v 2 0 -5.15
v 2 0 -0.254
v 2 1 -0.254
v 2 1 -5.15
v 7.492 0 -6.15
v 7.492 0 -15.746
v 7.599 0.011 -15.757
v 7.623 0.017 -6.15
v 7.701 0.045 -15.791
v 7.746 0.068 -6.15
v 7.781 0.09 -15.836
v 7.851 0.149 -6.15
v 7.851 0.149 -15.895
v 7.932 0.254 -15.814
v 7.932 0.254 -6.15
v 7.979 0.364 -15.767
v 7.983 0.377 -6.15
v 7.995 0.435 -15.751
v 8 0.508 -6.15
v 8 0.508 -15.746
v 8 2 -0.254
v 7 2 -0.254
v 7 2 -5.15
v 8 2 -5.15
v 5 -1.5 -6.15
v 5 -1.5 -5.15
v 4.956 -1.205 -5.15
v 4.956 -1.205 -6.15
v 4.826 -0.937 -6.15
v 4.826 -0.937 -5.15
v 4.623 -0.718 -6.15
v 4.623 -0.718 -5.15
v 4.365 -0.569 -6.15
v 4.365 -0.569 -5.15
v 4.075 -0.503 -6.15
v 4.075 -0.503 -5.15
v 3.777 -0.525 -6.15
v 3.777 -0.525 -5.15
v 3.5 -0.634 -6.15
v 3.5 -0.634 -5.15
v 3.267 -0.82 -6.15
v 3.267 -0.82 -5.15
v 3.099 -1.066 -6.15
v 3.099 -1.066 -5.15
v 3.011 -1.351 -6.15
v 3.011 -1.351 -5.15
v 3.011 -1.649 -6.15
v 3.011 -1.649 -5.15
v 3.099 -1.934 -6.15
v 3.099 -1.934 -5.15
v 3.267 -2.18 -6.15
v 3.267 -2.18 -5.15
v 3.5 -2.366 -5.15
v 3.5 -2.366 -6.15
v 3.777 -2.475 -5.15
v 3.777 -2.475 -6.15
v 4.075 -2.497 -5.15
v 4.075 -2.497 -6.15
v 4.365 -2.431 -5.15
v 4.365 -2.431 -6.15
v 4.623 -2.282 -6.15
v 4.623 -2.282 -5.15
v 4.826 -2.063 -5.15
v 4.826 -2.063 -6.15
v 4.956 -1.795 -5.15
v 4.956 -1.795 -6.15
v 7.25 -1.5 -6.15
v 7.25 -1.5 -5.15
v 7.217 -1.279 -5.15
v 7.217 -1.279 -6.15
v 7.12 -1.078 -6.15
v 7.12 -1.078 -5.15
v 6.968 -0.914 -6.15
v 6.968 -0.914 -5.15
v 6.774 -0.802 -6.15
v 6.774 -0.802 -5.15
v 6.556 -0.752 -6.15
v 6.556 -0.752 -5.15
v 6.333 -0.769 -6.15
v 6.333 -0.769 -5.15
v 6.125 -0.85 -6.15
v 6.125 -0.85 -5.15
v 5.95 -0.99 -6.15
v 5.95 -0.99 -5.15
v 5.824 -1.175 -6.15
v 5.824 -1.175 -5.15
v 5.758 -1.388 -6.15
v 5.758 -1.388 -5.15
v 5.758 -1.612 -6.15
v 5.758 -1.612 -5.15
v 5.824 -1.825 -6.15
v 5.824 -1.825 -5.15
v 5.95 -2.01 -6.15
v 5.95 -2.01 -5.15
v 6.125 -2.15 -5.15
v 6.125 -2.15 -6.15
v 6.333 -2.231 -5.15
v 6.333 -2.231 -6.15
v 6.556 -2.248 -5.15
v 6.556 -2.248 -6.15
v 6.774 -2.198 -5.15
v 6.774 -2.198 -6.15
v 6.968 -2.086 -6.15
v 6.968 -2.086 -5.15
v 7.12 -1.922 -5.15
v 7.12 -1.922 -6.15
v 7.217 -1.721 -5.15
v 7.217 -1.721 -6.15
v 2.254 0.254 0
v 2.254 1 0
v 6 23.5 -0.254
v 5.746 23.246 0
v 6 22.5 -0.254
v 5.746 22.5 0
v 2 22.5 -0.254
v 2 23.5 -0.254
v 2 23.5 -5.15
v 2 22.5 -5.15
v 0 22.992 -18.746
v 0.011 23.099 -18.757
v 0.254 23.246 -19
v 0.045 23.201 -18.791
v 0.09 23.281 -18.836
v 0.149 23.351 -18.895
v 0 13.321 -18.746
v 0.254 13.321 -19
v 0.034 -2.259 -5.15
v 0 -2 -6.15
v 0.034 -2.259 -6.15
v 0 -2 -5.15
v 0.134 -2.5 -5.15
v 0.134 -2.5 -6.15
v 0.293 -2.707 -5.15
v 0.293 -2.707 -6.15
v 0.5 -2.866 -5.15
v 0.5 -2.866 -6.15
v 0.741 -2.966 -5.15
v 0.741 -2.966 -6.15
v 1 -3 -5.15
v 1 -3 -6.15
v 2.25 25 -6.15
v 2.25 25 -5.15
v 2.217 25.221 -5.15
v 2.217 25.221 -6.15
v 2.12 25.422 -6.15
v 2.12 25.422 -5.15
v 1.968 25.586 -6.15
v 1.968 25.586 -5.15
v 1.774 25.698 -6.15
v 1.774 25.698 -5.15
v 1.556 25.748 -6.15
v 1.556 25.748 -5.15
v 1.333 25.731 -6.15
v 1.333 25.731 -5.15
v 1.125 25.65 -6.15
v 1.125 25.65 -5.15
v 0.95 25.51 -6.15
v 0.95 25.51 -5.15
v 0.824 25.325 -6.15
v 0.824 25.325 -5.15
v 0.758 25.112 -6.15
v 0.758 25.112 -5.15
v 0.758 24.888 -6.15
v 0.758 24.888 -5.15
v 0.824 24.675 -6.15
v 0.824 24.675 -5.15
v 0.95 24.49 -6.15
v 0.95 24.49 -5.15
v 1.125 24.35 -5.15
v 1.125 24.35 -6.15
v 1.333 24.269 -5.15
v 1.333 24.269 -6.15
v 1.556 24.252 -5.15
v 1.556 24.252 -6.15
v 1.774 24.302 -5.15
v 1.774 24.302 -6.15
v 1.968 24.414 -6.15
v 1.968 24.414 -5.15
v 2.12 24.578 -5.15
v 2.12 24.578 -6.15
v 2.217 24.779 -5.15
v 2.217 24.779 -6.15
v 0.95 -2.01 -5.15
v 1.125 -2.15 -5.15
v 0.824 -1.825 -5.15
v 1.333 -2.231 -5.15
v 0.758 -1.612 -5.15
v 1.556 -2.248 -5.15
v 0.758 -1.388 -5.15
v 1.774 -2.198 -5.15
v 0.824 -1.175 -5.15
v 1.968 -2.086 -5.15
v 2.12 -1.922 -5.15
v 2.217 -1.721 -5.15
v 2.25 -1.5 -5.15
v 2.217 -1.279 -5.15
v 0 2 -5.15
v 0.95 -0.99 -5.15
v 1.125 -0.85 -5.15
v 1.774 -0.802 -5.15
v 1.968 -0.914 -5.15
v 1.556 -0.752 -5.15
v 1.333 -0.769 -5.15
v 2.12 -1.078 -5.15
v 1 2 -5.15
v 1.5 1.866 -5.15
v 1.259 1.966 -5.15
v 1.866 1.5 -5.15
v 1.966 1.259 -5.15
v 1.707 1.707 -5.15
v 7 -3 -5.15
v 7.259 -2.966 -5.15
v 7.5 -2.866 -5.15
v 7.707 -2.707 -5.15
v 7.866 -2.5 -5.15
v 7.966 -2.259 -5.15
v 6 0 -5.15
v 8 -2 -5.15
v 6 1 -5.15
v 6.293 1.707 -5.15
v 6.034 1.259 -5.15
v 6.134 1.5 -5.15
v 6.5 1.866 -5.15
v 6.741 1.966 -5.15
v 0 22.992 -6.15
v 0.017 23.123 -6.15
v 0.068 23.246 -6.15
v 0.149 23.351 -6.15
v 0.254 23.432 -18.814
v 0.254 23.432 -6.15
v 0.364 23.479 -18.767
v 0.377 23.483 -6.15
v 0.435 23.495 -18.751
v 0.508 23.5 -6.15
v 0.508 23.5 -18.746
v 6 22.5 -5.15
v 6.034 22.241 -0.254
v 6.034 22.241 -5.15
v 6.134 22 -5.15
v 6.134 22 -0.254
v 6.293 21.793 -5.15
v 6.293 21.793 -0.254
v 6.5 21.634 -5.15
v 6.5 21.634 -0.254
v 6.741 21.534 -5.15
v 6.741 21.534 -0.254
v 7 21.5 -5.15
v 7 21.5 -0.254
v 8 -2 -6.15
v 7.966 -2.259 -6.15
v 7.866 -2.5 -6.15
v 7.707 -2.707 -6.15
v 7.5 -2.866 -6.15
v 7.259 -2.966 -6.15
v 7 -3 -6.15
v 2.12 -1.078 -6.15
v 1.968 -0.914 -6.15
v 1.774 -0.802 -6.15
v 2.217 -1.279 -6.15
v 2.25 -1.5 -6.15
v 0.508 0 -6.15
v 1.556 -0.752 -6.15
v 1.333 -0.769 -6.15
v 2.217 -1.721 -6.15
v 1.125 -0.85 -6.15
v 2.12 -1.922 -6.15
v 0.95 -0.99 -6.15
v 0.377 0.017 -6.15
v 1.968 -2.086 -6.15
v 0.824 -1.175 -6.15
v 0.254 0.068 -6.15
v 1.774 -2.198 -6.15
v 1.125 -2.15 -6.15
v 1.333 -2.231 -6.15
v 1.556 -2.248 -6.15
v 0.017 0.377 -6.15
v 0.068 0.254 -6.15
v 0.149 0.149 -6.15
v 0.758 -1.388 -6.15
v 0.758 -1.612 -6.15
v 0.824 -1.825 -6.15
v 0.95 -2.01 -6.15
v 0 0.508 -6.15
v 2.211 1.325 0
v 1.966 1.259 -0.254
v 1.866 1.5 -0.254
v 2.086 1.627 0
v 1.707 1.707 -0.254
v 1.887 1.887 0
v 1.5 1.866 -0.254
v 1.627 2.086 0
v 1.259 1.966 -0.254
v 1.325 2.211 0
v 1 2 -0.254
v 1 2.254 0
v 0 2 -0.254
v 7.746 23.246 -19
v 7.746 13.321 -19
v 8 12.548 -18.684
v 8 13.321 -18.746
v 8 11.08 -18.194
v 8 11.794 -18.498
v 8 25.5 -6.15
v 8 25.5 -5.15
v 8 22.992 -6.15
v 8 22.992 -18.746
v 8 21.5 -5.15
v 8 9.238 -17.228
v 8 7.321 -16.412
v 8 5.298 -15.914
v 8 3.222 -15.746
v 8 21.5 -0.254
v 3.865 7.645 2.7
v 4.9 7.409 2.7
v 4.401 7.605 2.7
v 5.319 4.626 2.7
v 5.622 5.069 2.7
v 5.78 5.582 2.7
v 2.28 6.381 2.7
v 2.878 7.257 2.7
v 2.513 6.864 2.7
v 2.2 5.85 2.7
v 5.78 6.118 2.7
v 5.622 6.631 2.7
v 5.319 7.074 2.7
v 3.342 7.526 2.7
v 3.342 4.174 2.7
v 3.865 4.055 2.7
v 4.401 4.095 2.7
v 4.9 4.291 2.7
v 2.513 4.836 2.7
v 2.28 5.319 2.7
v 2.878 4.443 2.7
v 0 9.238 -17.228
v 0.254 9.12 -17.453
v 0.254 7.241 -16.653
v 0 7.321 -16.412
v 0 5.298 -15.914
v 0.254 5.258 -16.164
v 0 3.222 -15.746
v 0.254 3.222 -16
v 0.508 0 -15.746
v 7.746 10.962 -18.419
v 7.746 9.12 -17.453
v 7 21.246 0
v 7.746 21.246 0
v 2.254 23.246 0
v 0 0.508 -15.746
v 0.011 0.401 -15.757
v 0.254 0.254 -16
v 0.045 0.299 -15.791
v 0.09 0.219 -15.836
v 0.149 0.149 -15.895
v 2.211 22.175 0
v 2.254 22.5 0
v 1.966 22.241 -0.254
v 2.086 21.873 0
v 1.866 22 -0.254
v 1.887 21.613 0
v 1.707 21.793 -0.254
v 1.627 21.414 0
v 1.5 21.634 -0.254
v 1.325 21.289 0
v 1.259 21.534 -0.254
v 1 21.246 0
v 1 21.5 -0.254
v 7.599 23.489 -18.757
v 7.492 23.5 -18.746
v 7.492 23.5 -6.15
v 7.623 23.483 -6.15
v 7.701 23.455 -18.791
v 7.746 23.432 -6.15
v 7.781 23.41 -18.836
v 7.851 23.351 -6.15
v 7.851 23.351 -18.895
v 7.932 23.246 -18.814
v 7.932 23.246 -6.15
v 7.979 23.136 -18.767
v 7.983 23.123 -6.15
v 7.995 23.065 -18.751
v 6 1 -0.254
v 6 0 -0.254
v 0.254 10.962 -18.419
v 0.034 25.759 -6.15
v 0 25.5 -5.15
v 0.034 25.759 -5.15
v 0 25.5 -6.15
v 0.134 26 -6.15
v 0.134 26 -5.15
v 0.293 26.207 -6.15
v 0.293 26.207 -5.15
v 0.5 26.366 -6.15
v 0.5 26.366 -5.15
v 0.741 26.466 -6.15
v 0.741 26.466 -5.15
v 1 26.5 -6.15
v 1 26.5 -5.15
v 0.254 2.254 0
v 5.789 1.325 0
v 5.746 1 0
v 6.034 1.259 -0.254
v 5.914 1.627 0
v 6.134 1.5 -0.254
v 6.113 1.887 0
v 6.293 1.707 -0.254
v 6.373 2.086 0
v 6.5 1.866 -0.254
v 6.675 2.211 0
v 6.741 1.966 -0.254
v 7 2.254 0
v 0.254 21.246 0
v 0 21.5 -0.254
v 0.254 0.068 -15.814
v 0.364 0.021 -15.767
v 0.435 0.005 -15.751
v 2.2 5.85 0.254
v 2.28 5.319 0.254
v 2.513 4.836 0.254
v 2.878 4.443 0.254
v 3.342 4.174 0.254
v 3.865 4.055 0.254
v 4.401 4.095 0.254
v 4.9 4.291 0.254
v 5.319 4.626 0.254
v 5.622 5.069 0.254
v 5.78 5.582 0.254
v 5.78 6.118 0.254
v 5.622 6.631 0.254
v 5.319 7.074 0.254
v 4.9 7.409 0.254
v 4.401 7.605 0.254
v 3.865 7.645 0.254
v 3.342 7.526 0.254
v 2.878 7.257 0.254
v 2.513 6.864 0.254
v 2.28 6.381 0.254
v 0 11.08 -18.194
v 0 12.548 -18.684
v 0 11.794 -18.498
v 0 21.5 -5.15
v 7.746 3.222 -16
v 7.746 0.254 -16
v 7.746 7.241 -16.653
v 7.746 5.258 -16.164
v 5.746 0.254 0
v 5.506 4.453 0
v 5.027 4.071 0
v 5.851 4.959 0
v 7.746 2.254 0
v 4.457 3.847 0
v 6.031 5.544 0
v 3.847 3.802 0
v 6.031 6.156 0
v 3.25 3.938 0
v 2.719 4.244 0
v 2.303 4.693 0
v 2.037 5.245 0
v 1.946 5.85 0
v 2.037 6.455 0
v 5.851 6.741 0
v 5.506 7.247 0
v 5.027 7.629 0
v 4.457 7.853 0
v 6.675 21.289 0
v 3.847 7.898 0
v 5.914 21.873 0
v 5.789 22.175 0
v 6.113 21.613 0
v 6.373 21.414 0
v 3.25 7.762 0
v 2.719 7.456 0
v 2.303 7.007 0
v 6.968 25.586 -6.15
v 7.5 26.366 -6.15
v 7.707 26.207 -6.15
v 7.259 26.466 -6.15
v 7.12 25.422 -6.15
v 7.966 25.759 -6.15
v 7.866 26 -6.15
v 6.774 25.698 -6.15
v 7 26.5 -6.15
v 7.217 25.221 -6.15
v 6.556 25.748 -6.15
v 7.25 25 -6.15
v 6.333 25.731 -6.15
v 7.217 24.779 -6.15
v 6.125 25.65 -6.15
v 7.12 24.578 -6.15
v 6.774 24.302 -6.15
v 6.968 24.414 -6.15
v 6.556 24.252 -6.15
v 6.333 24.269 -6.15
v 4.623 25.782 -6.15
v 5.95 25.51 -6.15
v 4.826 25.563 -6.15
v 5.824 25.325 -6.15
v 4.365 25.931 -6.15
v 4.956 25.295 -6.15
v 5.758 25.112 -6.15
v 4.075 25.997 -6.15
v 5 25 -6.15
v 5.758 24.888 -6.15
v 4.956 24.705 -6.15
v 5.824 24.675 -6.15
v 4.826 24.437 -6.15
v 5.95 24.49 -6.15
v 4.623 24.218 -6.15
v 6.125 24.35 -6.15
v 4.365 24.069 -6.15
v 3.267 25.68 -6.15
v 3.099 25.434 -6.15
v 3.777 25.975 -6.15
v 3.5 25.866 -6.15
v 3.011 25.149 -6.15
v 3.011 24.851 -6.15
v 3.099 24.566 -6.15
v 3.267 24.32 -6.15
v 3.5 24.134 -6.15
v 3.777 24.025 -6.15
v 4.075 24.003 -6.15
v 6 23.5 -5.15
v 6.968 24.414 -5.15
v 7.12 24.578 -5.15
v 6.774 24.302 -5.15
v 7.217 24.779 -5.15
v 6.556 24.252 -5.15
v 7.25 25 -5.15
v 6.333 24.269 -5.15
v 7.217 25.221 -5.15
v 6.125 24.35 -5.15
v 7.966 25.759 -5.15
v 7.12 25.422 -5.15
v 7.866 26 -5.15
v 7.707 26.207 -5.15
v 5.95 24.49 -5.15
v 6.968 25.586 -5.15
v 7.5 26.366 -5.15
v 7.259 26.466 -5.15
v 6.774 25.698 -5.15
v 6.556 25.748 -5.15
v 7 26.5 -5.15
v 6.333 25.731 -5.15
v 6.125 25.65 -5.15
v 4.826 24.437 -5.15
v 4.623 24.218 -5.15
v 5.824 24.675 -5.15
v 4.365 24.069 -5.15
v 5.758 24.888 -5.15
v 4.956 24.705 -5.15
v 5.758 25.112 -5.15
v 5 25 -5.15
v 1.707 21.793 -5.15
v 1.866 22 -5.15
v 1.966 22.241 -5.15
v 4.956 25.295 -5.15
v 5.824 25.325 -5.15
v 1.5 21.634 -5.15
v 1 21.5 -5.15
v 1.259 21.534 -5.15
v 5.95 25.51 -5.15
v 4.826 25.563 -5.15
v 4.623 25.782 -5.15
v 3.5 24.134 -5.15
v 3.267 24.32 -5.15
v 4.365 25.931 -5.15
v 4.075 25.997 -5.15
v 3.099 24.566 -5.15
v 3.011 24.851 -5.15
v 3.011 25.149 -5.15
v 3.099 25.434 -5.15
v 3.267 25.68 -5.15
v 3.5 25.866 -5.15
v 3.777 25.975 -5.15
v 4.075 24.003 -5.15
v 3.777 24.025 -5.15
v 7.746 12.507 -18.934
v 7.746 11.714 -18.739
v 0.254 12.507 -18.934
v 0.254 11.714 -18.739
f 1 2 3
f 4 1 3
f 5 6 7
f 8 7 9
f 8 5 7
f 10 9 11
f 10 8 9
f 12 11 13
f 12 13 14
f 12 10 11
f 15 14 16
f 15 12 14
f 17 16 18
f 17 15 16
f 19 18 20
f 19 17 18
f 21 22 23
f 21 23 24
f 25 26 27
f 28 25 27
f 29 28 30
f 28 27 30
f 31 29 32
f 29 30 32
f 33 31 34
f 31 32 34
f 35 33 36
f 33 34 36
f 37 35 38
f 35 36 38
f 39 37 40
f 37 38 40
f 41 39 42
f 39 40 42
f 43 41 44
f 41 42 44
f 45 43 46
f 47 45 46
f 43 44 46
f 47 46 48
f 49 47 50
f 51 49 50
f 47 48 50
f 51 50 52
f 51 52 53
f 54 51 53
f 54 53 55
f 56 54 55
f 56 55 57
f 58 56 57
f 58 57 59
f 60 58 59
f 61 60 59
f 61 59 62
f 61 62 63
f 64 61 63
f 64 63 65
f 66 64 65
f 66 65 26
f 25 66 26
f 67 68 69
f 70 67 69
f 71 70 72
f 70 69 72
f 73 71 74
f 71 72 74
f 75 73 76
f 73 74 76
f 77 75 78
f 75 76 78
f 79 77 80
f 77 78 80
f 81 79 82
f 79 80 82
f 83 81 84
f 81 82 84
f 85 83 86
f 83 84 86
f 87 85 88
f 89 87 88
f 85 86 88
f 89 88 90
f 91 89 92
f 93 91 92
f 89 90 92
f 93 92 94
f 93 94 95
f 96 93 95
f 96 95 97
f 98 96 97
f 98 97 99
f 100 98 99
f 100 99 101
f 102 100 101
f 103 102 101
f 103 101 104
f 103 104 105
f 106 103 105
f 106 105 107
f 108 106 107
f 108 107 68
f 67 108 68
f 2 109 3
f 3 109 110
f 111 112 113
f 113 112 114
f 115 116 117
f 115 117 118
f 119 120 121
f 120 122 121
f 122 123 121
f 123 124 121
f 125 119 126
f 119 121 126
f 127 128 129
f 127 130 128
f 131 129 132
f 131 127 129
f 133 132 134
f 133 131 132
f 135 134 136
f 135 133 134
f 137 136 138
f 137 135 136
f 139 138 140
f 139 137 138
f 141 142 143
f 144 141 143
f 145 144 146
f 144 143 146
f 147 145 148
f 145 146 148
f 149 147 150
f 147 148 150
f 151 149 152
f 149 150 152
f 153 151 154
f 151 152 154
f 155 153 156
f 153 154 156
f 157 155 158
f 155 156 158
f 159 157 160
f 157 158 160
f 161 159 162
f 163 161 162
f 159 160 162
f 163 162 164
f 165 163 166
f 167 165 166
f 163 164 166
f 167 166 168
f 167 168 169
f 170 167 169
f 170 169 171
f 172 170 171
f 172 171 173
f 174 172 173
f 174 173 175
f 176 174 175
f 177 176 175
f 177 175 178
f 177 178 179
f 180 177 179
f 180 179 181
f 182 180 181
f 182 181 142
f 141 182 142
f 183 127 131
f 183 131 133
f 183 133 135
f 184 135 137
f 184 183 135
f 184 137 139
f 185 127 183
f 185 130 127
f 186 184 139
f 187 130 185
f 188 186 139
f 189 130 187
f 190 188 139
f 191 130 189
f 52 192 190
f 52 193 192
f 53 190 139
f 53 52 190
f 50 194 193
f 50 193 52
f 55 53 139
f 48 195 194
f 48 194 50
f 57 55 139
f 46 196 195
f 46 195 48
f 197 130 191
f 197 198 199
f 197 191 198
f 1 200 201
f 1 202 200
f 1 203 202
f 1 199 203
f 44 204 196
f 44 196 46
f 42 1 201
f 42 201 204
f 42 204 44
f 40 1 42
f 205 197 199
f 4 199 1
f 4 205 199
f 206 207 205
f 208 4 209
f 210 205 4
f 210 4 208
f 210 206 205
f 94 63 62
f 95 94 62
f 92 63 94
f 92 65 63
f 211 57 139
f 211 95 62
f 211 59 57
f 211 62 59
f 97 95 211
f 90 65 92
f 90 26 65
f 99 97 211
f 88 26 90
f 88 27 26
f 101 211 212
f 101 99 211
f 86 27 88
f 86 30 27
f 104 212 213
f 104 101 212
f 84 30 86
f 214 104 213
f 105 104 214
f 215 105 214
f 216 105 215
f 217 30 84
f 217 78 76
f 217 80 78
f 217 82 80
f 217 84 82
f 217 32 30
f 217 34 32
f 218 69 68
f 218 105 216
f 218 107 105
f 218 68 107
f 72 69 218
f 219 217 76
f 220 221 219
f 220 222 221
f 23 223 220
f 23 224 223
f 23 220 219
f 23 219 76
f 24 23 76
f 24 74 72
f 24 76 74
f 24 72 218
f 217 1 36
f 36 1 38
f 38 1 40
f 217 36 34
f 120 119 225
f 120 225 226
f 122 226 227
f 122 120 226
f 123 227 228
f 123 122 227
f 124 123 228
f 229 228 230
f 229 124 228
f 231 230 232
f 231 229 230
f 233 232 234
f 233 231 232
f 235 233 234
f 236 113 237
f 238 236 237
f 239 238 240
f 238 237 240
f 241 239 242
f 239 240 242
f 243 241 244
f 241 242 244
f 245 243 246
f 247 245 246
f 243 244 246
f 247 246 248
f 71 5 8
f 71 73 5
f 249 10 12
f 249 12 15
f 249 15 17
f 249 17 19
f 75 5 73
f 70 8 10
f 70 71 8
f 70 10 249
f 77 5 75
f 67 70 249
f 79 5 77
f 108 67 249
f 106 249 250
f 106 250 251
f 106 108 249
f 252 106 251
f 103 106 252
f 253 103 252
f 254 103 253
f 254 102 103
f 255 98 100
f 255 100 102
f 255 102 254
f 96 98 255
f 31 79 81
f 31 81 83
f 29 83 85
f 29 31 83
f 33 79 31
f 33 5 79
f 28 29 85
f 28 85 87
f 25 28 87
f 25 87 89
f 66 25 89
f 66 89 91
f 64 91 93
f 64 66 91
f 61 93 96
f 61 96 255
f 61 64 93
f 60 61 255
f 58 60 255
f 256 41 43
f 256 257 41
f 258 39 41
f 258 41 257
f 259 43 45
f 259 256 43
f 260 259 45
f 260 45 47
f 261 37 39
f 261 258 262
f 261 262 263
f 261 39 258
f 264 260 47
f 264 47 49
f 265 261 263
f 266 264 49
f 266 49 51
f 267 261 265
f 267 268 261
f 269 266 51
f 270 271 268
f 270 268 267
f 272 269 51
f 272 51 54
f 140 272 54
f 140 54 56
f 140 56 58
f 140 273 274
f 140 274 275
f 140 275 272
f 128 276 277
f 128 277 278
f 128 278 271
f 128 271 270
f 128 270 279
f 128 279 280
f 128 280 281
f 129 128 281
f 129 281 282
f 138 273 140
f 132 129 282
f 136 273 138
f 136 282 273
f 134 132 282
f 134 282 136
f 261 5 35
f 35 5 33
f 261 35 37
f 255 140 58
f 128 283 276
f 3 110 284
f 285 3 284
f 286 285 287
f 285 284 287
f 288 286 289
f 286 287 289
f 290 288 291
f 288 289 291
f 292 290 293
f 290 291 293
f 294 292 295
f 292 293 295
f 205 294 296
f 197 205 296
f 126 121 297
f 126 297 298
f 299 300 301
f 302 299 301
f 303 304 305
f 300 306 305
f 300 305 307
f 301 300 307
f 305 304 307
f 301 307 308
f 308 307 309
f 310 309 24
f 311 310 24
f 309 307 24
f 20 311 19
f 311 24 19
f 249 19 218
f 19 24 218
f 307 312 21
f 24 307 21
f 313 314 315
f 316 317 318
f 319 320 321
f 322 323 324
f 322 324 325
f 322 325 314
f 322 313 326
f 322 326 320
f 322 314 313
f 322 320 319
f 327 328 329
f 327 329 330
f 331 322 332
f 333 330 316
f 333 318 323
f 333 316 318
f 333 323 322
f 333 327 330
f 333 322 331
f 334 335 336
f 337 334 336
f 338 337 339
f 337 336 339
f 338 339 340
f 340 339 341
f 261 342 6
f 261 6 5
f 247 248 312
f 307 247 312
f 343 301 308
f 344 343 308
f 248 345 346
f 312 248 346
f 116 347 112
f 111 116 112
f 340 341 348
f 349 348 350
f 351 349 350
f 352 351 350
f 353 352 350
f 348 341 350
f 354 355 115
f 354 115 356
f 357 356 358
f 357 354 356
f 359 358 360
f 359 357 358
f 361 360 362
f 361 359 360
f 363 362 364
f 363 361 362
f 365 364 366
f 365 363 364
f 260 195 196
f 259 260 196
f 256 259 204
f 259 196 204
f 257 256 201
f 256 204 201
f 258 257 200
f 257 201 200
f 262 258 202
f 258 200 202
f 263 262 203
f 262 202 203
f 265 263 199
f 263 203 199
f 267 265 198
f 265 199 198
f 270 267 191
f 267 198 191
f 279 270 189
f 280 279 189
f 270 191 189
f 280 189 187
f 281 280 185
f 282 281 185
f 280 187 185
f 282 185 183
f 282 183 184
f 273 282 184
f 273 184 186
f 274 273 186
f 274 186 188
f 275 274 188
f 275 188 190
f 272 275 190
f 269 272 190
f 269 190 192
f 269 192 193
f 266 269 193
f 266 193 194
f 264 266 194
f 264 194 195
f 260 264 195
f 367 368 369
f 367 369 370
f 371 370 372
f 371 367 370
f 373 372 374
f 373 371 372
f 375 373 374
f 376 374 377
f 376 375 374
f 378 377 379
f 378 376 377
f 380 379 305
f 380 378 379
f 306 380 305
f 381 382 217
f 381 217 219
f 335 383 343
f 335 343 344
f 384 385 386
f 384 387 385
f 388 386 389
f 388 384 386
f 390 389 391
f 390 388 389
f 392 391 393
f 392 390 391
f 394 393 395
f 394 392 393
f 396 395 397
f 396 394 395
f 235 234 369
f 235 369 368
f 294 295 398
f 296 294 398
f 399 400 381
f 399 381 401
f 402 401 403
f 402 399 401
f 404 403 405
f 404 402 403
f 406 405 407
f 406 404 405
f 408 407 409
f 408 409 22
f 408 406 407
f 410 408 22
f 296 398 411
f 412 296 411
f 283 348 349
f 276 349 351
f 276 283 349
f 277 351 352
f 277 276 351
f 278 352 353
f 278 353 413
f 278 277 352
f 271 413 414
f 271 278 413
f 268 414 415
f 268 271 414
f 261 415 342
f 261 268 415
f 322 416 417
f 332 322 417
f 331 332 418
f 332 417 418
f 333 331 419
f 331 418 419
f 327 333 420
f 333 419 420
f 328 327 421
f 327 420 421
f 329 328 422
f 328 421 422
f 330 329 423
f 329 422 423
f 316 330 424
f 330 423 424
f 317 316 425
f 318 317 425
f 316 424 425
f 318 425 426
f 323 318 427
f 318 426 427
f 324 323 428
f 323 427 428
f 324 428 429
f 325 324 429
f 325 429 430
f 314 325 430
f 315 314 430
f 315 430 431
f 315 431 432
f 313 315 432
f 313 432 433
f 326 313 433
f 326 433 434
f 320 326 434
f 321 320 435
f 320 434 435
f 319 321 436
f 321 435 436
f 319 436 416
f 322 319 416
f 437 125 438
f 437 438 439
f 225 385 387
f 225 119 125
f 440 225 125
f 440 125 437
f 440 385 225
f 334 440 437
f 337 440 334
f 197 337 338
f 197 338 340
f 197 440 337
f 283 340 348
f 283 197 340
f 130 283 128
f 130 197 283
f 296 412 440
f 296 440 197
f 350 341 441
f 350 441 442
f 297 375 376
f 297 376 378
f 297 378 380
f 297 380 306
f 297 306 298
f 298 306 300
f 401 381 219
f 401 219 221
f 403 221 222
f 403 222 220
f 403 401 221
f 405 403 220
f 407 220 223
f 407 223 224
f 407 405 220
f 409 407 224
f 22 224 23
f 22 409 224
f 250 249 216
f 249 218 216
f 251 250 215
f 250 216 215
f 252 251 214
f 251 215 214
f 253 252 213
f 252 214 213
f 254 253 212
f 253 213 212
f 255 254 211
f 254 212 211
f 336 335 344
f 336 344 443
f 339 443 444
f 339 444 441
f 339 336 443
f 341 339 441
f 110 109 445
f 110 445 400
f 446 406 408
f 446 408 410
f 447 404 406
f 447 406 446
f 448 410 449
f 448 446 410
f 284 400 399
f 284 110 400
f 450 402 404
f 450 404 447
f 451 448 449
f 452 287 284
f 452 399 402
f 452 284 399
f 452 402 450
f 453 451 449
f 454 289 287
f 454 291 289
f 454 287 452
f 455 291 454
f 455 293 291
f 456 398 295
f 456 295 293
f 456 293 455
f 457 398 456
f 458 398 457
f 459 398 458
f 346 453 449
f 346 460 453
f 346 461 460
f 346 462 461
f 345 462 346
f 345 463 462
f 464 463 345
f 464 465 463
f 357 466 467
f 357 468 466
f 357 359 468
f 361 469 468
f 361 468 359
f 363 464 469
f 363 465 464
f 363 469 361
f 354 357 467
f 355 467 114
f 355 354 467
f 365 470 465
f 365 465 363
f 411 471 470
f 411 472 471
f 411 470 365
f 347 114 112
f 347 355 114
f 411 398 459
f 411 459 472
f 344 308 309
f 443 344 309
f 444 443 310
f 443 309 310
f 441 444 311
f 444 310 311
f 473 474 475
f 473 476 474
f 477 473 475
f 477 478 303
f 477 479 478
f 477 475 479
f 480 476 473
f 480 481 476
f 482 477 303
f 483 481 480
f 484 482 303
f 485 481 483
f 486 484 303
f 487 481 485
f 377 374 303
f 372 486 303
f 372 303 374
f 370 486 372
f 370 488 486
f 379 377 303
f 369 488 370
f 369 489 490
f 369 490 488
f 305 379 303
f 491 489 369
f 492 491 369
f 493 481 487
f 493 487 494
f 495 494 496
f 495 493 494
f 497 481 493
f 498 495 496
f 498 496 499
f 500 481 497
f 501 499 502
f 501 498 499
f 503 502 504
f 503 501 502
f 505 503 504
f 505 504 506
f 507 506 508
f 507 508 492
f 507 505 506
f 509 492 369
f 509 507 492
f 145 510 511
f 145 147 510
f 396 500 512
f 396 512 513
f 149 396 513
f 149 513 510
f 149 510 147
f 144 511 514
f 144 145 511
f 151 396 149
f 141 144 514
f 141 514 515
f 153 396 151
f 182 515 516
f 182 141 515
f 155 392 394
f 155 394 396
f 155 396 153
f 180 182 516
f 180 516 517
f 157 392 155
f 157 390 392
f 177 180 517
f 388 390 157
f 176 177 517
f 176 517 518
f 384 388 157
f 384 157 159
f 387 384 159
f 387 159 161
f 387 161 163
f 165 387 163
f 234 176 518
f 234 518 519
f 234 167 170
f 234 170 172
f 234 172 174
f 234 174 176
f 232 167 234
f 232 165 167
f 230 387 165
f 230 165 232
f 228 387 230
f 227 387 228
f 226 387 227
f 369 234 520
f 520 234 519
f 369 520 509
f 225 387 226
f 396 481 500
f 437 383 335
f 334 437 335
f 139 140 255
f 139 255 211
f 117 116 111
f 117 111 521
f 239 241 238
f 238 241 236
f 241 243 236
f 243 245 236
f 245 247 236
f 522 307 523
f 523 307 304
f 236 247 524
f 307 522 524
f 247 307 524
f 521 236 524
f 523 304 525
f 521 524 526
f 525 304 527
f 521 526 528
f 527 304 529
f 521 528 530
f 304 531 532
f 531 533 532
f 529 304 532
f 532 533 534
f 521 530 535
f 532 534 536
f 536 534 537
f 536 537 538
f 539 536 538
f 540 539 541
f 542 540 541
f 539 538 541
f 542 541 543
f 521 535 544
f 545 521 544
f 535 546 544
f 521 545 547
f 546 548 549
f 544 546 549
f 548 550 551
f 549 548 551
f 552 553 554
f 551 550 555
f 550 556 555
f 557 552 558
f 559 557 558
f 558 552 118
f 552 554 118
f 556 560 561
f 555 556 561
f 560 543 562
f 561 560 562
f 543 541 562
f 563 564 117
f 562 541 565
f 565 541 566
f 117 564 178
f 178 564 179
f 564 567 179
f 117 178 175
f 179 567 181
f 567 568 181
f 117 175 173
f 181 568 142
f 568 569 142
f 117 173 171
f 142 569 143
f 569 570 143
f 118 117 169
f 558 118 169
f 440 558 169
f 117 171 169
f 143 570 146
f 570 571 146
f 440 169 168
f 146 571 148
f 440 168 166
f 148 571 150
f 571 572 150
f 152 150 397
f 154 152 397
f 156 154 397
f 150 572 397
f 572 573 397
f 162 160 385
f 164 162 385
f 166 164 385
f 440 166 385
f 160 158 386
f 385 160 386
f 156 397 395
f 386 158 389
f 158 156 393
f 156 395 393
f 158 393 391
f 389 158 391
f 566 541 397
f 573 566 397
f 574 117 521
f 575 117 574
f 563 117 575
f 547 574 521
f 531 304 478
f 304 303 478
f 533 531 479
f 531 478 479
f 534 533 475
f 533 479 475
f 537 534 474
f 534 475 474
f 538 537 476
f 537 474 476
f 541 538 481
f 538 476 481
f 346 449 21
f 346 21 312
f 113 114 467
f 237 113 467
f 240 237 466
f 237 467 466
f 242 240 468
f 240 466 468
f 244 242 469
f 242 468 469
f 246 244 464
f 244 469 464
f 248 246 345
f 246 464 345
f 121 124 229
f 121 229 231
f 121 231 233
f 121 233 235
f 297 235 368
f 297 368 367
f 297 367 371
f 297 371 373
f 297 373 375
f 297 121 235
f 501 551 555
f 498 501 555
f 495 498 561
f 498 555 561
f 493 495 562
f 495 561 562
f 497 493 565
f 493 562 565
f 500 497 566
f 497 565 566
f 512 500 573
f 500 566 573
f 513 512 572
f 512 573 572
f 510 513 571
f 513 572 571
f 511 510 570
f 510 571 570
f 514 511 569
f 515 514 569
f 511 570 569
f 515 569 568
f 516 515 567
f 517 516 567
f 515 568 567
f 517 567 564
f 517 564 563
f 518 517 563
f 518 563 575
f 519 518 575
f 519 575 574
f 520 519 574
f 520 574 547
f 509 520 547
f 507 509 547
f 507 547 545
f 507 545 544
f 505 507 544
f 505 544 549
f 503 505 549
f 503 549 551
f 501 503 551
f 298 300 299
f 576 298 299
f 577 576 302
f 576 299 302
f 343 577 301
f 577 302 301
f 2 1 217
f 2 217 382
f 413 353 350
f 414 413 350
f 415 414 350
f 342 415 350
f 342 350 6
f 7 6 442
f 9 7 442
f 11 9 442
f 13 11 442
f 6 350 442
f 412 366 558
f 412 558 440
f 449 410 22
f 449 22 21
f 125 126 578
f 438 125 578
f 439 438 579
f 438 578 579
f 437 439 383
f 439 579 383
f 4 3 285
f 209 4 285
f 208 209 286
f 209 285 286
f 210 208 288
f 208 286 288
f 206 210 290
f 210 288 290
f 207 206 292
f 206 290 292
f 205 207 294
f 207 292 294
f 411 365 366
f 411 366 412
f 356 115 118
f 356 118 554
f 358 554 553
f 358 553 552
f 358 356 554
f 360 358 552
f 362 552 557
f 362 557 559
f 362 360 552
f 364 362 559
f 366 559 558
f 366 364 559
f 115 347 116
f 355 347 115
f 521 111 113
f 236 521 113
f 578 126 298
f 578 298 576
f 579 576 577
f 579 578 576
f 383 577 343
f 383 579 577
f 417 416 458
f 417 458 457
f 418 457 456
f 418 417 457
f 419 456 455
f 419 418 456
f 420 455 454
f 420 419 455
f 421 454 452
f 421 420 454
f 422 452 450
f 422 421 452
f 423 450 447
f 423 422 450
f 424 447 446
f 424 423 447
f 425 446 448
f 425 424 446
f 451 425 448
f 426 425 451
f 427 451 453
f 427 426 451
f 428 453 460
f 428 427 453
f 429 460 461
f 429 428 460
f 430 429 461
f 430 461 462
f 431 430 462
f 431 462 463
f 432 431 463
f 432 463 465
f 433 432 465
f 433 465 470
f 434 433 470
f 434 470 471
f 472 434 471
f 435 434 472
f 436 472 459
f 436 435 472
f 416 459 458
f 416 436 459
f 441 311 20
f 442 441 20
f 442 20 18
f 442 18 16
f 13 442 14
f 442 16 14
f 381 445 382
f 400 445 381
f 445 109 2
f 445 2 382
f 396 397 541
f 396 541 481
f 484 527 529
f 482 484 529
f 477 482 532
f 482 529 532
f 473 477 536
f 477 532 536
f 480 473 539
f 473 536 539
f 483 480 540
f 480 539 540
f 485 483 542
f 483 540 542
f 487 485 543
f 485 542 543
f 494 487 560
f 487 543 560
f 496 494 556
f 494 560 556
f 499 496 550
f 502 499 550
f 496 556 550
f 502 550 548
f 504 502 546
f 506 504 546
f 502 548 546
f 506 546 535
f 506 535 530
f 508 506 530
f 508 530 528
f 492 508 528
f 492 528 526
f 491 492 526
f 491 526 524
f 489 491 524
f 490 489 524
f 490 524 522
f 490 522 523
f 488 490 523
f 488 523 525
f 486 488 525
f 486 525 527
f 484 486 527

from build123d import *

# Parameters (mm, degrees)
BOSS_EXTRUDE1_DEPTH = 8
SKETCH2_R           = 1
SKETCH2_R_2         = 0.75
CUT_EXTRUDE1_DEPTH  = 31.952746243
FILLET1_R           = 1
SKETCH3_R           = 1.8
BOSS_EXTRUDE2_DEPTH = 2.7
CUT_EXTRUDE2_DEPTH  = 5.15
CHAMFER1_SIZE       = 0.254
CHAMFER2_SIZE       = 0.254
FILLET2_R           = 0.508


with BuildPart() as part:
    # Sketch1 → Boss-Extrude1 (new body)
    with BuildSketch(Plane.YZ):
        with BuildLine():
            Line((0, 0), (23.5, 0))
            Line((23.5, 0), (23.5, -5.15))
            Line((23.5, -5.15), (26.5, -5.15))
            Line((26.5, -5.15), (26.5, -6.15))
            Line((26.5, -6.15), (23.5, -6.15))
            Line((23.5, -6.15), (23.5, -19))
            Line((23.5, -19), (13.321336499, -19))
            ThreePointArc((13.321336499, -19), (12.106318726, -18.852558343), (10.961830178, -18.418792051))
            Line((10.961830178, -18.418792051), (9.120424555, -17.453019871))
            ThreePointArc((9.120424555, -17.453019871), (6.259203186, -16.368604142), (3.221658753, -16))
            Line((3.221658753, -16), (0, -16))
            Line((0, -16), (0, -6.15))
            Line((0, -6.15), (-3, -6.15))
            Line((-3, -6.15), (-3, -5.15))
            Line((-3, -5.15), (0, -5.15))
            Line((0, -5.15), (0, 0))
        make_face()
    extrude(amount=BOSS_EXTRUDE1_DEPTH)

    # Sketch2 → Cut-Extrude1 (cut, through all)
    with BuildSketch(Plane.XY.offset(-5.15)):
        with Locations((4, -1.5)):
            Circle(SKETCH2_R)
        with Locations((4, 25)):
            Circle(SKETCH2_R)
        with Locations((6.5, 25)):
            Circle(SKETCH2_R_2)
        with Locations((1.5, 25)):
            Circle(SKETCH2_R_2)
        with Locations((1.5, -1.5)):
            Circle(SKETCH2_R_2)
        with Locations((6.5, -1.5)):
            Circle(SKETCH2_R_2)
    extrude(amount=-CUT_EXTRUDE1_DEPTH, mode=Mode.SUBTRACT)

    # Fillet1
    fillet1_edges = [part.edges().sort_by_distance(p)[0] for p in [
        (8, -3, -5.65),
        (0, 26.5, -5.65),
        (0, -3, -5.65),
        (8, 26.5, -5.65),
    ]]
    fillet(fillet1_edges, radius=FILLET1_R)

    # Sketch3 → Boss-Extrude2 (add)
    with BuildSketch(Plane.XY):
        with Locations(Location((4, 5.85, 0), (0, 0, 180))):
            Circle(SKETCH3_R)
    extrude(amount=BOSS_EXTRUDE2_DEPTH)

    # Sketch4 → Cut-Extrude2 (cut)
    with BuildSketch(Plane.XY):
        with BuildLine():
            Line((0, 23.5), (2, 23.5))
            Line((2, 23.5), (2, 22.5))
            ThreePointArc((2, 22.5), (1.707106781, 21.792893219), (1, 21.5))
            Line((1, 21.5), (0, 21.5))
            Line((0, 21.5), (0, 23.5))
        make_face()
        with BuildLine():
            Line((8, 23.5), (6, 23.5))
            Line((6, 23.5), (6, 22.5))
            ThreePointArc((6, 22.5), (6.292893219, 21.792893219), (7, 21.5))
            Line((7, 21.5), (8, 21.5))
            Line((8, 21.5), (8, 23.5))
        make_face()
        with BuildLine():
            Line((0, 0), (2, 0))
            Line((2, 0), (2, 1))
            ThreePointArc((2, 1), (1.707106781, 1.707106781), (1, 2))
            Line((1, 2), (0, 2))
            Line((0, 2), (0, 0))
        make_face()
        with BuildLine():
            Line((8, 0), (6, 0))
            Line((6, 0), (6, 1))
            ThreePointArc((6, 1), (6.292893219, 1.707106781), (7, 2))
            Line((7, 2), (8, 2))
            Line((8, 2), (8, 0))
        make_face()
    extrude(amount=-CUT_EXTRUDE2_DEPTH, mode=Mode.SUBTRACT)

    # Chamfer1
    chamfer1_edges = [part.edges().sort_by_distance(p)[0] for p in [
        (5.8, 5.85, 0),
        (0, 11.75, 0),
        (8, 11.75, 0),
        (4, 0, 0),
        (4, 23.5, 0),
        (6, 23, 0),
        (6.292893219, 21.792893219, 0),
        (7.5, 21.5, 0),
        (2, 0.5, 0),
        (1.707106781, 1.707106781, 0),
        (0.5, 2, 0),
        (7.5, 2, 0),
        (6.292893219, 1.707106781, 0),
        (6, 0.5, 0),
        (0.5, 21.5, 0),
        (1.707106781, 21.792893219, 0),
        (2, 23, 0),
    ]]
    chamfer(chamfer1_edges, length=CHAMFER1_SIZE)

    # Chamfer2
    chamfer2_edges = [part.edges().sort_by_distance(p)[0] for p in [
        (0, 18.410668249, -19),
        (0, 12.106318726, -18.852558343),
        (0, 10.041127366, -17.935905961),
        (0, 6.259203186, -16.368604142),
        (0, 1.610829376, -16),
        (8, 1.610829376, -16),
        (4, 23.5, -19),
        (4, 0, -16),
        (8, 6.259203186, -16.368604142),
        (8, 10.041127366, -17.935905961),
        (8, 12.106318726, -18.852558343),
        (8, 18.410668249, -19),
    ]]
    chamfer(chamfer2_edges, length=CHAMFER2_SIZE)

    # Fillet2
    fillet2_edges = [part.edges().sort_by_distance(p)[0] for p in [
        (0, 0, -10.948),
        (8, 0, -10.948),
        (0, 23.5, -12.448),
        (8, 23.5, -12.448),
    ]]
    fillet(fillet2_edges, radius=FILLET2_R)


solid = part.part
